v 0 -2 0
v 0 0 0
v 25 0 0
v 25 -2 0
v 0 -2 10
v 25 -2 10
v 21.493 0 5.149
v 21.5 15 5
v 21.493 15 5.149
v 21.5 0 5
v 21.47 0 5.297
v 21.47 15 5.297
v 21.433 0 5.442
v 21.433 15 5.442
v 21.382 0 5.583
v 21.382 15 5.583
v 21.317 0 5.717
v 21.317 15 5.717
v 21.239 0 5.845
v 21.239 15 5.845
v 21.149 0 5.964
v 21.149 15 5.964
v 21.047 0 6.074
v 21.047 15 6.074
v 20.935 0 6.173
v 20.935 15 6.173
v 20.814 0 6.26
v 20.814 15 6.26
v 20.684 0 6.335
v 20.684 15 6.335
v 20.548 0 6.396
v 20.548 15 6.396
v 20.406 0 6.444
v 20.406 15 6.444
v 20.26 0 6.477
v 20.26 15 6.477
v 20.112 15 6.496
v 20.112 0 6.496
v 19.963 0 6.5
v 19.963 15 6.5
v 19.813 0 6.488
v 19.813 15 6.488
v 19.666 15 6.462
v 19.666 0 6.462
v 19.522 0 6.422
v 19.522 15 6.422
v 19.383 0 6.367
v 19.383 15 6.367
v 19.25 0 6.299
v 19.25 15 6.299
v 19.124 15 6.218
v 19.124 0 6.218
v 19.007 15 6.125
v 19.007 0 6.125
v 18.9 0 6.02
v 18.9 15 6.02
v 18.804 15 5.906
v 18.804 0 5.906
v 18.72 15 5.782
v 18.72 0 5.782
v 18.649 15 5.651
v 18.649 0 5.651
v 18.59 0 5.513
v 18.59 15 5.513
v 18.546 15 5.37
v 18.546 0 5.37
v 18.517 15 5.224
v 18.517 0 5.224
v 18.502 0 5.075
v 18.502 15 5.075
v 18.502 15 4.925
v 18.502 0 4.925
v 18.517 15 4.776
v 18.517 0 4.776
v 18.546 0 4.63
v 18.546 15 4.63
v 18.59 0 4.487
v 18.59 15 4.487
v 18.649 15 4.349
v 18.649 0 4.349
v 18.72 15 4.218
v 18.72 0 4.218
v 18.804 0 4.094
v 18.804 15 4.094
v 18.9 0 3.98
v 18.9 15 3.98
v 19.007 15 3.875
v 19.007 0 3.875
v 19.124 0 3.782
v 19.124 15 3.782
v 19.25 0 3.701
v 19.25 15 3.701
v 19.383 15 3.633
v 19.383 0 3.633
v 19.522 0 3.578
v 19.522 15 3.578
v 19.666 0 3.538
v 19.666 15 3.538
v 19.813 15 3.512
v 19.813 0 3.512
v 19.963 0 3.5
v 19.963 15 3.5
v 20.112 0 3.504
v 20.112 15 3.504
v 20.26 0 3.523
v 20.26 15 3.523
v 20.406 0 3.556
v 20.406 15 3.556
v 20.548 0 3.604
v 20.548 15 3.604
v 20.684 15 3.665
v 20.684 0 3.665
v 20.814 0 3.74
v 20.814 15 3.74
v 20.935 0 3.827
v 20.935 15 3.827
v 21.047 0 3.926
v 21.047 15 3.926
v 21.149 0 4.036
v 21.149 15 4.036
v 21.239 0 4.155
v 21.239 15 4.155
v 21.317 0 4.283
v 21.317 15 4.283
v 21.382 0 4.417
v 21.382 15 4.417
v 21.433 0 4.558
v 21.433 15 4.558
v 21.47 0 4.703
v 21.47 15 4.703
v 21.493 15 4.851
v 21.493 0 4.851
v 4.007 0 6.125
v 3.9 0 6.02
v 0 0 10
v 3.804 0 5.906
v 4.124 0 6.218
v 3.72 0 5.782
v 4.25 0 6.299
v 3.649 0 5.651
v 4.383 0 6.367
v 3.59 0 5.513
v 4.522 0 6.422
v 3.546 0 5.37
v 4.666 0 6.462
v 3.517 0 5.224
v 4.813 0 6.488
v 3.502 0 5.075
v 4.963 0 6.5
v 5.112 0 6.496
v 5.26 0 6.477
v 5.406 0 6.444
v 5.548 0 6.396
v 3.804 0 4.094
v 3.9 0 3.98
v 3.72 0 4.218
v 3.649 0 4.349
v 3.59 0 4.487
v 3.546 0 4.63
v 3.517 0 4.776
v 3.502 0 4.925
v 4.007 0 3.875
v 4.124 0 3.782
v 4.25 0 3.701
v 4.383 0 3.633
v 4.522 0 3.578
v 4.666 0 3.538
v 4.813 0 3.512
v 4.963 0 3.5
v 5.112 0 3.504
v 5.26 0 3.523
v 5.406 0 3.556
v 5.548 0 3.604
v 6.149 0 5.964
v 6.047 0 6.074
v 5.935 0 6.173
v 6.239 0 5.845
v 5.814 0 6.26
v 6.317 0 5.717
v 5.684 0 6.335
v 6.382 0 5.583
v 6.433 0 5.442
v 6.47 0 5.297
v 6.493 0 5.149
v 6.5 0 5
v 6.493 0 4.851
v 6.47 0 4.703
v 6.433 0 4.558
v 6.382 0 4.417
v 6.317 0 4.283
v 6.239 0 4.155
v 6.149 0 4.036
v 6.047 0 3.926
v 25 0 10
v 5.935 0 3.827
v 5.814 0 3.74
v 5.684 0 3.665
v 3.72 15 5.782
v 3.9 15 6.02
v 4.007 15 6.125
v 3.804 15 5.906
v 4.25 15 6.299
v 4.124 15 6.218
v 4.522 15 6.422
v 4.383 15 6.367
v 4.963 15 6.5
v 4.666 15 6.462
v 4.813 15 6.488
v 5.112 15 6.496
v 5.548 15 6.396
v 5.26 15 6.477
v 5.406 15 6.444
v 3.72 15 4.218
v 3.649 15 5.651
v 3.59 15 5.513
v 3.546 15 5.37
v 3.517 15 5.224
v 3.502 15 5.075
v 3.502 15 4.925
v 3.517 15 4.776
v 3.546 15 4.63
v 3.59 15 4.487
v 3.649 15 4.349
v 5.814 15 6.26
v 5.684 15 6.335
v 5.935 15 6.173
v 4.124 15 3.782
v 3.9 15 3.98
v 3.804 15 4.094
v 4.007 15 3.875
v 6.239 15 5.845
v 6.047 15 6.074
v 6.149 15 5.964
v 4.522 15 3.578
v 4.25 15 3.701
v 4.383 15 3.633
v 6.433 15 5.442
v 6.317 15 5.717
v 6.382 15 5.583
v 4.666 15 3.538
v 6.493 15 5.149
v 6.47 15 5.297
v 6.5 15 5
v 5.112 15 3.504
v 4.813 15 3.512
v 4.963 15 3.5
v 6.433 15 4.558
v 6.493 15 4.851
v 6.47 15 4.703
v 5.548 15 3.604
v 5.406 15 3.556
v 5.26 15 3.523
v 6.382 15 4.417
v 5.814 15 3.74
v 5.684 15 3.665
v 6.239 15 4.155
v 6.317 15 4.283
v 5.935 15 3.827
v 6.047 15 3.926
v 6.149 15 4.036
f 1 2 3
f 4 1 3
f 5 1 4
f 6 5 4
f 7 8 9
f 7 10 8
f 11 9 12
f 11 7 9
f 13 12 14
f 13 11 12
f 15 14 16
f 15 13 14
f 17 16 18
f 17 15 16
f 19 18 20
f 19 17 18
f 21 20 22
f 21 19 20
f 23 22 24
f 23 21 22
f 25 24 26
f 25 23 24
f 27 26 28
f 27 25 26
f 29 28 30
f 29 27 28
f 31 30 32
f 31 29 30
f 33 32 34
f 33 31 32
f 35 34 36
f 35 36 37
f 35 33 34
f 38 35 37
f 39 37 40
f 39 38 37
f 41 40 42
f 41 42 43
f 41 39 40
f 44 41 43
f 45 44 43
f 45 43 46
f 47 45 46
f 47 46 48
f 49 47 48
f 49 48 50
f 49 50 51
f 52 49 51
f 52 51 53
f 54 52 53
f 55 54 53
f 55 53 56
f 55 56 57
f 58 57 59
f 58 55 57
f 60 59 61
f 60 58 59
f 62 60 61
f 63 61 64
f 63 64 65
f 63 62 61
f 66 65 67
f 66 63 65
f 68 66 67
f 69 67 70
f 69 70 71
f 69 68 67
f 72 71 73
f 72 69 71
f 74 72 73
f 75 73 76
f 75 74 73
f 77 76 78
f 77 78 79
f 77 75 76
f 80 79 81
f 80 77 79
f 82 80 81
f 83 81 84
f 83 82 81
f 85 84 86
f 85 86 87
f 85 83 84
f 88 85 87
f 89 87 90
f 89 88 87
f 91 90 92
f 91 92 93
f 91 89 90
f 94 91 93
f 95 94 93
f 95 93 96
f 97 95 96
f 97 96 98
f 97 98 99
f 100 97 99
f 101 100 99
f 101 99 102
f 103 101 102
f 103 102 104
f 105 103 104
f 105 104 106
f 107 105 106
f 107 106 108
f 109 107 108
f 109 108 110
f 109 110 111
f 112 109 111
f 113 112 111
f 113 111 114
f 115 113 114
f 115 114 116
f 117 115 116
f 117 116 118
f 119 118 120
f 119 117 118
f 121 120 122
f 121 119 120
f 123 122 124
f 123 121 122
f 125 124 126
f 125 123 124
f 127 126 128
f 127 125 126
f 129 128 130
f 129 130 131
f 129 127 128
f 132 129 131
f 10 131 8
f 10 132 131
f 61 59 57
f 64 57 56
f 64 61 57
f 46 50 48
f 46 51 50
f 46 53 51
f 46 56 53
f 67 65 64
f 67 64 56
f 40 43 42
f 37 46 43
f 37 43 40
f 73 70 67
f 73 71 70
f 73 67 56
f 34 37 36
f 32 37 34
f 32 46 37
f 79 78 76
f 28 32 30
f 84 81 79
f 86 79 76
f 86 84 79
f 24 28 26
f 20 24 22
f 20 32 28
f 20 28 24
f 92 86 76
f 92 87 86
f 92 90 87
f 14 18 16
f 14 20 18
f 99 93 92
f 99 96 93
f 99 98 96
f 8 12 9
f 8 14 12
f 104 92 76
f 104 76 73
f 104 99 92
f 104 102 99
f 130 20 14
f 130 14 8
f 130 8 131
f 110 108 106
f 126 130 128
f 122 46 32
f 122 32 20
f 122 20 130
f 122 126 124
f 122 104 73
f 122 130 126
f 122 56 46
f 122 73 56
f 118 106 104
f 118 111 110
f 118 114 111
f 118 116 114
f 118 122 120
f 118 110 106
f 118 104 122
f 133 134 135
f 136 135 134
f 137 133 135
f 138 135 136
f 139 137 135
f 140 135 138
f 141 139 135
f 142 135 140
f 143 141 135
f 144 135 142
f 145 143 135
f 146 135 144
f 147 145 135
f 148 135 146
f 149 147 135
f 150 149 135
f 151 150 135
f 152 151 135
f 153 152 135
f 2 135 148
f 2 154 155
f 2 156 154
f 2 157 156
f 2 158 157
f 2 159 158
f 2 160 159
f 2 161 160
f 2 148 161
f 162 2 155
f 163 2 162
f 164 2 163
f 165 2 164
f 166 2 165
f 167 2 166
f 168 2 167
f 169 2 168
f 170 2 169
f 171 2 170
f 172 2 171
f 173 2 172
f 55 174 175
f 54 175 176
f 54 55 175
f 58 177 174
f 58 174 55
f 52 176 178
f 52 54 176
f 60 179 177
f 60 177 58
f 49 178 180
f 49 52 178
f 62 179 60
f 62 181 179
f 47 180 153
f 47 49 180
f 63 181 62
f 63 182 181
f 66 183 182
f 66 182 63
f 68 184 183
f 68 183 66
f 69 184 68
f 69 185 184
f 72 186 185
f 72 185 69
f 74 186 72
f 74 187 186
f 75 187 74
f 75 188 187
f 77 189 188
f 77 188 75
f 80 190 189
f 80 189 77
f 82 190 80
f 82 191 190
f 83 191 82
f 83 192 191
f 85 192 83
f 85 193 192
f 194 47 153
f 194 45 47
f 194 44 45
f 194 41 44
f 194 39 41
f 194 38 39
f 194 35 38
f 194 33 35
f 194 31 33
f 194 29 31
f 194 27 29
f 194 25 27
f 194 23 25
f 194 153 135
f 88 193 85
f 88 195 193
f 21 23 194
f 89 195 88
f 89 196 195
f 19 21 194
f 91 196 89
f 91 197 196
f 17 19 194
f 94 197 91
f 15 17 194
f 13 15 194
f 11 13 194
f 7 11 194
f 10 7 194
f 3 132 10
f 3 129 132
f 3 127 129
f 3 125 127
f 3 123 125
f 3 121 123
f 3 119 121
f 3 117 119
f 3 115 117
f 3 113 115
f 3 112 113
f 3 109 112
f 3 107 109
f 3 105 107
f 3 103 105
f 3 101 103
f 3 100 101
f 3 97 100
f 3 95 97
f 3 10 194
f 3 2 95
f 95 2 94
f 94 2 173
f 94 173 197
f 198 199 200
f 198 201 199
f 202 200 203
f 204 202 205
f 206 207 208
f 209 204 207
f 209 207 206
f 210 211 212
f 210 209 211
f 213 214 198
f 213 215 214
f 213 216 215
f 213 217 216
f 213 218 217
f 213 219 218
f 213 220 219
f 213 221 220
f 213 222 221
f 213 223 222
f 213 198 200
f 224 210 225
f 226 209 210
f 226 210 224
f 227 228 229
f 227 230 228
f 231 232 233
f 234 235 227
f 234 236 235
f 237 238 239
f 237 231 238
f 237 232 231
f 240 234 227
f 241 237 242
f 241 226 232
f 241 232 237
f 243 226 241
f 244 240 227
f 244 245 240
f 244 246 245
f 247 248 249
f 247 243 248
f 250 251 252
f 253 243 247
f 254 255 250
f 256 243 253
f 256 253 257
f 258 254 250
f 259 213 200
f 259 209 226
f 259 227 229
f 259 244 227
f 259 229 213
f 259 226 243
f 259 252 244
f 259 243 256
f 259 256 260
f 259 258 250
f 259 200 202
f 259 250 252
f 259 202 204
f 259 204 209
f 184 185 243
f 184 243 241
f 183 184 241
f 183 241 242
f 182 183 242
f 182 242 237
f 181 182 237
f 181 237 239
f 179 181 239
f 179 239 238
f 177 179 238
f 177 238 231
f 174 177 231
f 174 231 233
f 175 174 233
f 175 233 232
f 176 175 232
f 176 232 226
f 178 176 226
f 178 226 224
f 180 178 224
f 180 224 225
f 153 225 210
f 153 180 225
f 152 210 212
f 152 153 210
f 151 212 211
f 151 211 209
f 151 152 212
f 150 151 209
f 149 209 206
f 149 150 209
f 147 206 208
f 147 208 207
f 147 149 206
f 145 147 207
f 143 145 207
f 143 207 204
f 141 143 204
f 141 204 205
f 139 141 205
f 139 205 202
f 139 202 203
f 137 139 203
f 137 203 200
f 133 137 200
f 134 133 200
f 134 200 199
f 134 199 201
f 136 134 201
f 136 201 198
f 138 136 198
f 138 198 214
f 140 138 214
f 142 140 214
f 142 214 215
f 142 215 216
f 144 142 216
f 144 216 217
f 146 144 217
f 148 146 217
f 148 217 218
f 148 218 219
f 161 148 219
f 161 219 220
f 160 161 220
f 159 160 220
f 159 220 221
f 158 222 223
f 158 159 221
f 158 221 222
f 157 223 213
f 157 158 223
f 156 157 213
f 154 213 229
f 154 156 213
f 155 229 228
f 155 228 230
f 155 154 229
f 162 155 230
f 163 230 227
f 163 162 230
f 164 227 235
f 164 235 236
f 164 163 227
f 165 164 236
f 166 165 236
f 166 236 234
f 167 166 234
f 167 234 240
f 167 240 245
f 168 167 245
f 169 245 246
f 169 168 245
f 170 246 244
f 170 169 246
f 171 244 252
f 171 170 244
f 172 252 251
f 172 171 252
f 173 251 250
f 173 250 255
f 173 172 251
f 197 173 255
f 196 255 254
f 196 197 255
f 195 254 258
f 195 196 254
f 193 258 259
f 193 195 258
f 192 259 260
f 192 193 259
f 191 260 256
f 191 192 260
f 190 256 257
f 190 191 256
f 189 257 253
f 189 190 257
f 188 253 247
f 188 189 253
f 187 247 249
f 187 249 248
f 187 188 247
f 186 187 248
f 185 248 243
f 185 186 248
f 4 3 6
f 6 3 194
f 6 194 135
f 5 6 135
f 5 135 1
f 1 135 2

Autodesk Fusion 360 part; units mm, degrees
sketch "Sketch1" plane through (0, 0, 0) normal (0, 1, 0) x (1, 0, 0)
  line L0 (0, 0) -> (25, 0)
  line L1 (25, 0) -> (25, -10)
  line L2 (25, -10) -> (0, -10)
  line L3 (0, -10) -> (0, 0)
  line L4 (0, -10) -> (10, -10)
  line L5 (25, 0) -> (15, 0)
  line L6 (0, 0) -> (10, -10)
  line L7 (15, 0) -> (25, -10)
  circle A0 centre (5, -5) radius 1.5
  circle A1 centre (20, -5) radius 1.5
  dimension "d1" = 25
  dimension "d2" = 10
  dimension "d3" = 10
  dimension "d4" = 10
  dimension "d5" = 3
  dimension "d6" = 3
extrude "Extrude1" add sketch "Sketch1" against normal blind 2
extrude "Extrude2" add sketch "Sketch1" along normal blind 15 contours L6 A0 | L6 A0 | L7 A1 | L7 A1
